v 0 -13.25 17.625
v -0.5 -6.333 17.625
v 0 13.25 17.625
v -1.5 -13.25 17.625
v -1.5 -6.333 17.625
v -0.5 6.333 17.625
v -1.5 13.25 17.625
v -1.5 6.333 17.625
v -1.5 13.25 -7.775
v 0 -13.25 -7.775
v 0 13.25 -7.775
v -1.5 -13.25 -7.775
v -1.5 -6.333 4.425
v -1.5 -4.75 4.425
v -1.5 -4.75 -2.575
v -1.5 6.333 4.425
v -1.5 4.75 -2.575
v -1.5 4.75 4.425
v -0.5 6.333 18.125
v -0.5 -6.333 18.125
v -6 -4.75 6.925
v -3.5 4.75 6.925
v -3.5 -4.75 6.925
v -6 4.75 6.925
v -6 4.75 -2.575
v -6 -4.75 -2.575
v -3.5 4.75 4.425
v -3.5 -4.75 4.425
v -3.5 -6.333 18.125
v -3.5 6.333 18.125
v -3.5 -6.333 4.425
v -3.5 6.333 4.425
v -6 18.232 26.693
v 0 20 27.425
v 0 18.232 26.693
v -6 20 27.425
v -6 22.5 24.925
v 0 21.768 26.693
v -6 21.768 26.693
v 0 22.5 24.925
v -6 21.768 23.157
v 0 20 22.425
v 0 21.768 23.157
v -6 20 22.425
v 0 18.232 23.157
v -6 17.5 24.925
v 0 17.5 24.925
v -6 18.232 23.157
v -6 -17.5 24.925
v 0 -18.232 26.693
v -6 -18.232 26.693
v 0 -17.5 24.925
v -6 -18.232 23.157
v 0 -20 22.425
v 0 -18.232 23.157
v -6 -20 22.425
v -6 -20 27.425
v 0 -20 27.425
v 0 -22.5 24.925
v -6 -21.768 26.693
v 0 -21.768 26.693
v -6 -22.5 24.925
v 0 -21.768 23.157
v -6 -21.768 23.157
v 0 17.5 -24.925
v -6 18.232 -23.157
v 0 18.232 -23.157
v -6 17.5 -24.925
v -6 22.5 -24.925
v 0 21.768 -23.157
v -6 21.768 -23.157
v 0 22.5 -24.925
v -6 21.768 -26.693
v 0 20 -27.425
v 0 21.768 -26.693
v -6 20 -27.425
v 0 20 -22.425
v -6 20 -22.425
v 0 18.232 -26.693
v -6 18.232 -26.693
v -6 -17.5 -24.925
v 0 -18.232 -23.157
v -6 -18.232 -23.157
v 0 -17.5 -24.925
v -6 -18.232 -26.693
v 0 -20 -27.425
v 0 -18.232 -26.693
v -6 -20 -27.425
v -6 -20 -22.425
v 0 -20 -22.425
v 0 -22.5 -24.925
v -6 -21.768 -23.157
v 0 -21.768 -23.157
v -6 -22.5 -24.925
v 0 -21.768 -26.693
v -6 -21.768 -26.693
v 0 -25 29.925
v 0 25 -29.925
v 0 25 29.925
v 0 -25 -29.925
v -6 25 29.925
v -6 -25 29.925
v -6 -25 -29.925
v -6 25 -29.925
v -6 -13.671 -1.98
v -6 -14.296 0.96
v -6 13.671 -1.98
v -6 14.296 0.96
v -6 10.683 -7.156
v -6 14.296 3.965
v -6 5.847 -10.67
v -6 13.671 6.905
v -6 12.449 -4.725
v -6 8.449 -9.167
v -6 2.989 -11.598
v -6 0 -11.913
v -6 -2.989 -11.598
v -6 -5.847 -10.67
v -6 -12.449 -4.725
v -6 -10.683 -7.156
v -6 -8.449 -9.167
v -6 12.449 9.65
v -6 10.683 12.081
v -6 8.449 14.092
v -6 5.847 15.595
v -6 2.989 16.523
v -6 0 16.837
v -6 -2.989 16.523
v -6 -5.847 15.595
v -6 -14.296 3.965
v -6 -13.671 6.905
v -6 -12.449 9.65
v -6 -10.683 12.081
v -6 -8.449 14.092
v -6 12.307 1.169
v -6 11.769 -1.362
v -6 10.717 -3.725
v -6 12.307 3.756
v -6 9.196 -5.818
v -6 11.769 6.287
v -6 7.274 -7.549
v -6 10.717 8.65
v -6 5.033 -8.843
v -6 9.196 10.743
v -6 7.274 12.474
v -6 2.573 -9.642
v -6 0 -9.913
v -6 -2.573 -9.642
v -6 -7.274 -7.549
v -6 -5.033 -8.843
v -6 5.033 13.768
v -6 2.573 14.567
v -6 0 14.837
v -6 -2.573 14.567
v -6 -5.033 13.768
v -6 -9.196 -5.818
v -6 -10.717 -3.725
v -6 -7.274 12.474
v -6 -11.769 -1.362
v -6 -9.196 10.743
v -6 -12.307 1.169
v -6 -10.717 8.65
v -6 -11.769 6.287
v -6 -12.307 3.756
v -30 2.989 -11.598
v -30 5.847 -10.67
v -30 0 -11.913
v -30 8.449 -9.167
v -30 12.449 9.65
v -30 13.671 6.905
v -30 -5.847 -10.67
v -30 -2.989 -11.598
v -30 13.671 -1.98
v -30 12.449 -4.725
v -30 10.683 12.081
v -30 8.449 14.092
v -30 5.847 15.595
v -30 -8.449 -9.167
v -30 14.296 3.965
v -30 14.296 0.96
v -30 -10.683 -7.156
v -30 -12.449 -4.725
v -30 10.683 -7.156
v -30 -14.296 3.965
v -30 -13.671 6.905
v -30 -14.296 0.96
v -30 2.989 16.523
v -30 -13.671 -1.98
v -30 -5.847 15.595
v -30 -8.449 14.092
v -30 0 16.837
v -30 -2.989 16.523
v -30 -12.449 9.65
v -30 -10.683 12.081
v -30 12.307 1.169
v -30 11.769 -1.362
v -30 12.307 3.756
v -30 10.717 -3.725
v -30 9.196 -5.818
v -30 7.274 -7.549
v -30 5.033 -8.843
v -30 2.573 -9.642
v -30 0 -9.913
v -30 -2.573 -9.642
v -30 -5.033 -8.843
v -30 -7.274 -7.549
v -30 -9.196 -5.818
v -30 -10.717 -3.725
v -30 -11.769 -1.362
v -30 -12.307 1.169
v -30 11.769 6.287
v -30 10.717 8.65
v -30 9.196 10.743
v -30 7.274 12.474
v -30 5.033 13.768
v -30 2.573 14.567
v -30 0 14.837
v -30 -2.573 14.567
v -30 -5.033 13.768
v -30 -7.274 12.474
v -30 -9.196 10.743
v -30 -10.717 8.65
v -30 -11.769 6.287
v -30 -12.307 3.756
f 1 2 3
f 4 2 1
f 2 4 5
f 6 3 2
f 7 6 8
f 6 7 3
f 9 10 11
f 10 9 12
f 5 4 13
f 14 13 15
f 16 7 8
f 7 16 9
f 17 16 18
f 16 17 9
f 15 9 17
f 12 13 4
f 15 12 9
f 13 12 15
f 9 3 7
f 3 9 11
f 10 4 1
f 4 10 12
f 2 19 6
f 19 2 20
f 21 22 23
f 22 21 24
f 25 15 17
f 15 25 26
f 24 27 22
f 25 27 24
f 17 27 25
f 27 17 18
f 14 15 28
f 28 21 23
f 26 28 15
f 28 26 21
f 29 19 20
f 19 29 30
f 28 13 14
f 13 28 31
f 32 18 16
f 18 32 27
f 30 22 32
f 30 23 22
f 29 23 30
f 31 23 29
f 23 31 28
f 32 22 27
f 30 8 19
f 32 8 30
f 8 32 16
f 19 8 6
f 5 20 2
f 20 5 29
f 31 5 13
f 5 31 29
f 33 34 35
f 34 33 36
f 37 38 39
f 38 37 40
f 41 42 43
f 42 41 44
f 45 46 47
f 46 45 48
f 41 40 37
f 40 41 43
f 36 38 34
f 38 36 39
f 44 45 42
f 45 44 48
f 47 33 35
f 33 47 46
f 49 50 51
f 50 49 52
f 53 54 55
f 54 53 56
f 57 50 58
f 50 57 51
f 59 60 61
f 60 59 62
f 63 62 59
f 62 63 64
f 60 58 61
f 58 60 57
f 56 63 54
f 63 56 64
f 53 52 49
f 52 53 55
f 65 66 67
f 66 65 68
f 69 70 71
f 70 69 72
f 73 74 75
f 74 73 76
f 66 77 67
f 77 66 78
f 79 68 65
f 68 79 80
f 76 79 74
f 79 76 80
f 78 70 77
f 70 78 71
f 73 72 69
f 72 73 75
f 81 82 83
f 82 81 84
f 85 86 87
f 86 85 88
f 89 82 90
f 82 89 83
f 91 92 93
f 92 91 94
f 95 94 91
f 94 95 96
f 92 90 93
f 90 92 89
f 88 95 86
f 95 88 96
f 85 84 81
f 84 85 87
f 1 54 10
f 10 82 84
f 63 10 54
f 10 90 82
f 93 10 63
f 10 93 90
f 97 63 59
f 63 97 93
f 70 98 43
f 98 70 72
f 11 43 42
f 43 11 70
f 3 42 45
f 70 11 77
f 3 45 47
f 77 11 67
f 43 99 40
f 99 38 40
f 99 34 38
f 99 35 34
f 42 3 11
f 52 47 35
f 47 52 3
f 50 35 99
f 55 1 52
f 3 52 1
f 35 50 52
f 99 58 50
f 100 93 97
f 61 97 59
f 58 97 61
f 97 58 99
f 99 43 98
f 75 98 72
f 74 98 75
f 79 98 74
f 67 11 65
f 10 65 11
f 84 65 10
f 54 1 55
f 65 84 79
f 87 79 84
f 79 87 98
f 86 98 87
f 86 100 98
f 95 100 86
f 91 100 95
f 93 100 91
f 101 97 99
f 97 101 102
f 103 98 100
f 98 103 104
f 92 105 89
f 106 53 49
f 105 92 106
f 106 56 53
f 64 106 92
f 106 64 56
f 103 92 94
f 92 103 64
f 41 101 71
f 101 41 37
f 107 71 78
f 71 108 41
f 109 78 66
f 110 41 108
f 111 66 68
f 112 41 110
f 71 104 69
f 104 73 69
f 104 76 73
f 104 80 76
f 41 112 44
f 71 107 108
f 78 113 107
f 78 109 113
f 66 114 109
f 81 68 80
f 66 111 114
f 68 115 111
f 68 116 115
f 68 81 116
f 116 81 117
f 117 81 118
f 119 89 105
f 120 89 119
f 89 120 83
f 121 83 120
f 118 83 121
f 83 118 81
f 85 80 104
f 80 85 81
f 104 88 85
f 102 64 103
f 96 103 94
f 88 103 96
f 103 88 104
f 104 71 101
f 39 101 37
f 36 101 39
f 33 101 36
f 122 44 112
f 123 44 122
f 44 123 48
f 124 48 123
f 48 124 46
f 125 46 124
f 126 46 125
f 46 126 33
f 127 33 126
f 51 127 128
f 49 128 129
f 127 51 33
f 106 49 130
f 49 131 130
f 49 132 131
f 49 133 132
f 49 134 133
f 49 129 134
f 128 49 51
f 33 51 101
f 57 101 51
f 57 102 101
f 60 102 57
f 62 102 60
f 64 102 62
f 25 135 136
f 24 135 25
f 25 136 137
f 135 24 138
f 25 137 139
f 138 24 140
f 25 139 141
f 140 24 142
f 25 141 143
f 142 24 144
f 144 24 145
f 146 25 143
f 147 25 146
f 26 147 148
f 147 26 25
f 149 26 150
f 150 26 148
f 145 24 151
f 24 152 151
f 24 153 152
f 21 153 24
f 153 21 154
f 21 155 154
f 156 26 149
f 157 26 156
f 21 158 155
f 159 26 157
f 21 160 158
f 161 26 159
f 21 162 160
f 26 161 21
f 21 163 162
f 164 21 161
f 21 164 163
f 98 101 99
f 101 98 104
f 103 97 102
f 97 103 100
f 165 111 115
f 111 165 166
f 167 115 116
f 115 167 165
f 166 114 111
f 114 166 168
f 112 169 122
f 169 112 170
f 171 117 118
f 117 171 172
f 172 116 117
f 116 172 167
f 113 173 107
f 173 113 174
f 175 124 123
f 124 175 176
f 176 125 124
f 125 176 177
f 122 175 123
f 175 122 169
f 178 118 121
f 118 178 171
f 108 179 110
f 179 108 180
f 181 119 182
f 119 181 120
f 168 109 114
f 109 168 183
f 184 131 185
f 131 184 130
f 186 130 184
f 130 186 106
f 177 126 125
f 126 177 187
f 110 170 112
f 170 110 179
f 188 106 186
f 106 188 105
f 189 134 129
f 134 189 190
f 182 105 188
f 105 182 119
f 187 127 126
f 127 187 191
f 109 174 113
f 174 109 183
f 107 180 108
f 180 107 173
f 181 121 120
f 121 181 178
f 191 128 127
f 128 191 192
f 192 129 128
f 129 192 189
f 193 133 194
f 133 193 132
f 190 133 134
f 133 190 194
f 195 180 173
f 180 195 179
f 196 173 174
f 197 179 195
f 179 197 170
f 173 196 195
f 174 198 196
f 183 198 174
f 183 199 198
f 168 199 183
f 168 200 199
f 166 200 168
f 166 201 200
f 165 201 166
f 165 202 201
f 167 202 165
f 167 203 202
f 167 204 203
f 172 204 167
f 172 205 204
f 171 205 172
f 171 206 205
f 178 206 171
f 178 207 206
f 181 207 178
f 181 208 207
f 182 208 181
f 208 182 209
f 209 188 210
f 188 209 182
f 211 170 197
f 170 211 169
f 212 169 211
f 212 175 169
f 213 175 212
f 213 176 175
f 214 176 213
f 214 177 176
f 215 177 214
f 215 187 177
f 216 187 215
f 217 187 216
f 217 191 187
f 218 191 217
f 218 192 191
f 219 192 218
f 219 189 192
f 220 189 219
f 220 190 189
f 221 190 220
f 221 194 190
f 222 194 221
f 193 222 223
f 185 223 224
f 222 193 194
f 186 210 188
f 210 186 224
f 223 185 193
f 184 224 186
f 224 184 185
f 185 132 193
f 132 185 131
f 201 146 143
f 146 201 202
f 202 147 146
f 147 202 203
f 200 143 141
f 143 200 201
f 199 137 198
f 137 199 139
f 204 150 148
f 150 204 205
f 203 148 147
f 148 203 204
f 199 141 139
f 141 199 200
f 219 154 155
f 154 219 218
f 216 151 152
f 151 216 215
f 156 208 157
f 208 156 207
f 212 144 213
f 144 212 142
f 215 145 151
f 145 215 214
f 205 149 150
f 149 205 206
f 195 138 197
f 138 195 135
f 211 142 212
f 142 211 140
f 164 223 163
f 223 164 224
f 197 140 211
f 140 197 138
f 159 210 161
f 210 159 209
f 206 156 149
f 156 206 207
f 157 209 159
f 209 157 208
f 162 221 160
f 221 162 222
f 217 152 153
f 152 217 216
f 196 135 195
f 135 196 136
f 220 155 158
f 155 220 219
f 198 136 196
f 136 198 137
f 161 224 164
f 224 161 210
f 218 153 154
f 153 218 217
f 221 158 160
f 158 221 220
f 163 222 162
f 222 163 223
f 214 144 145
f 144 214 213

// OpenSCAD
// file: ../cameramount/PiCameraMount.scad
/*
 * openSCAD for a simple mount for the Raspberry PI Camera Module
 *
 * This file is not for standalone use - it's included in to another
 * openSCAN file for including in to another model.
 *
 * Copyright 2015 Peter T Mount
 * 
 * Licensed under the Apache License, Version 2.0 (the "License");
 * you may not use this file except in compliance with the License.
 * You may obtain a copy of the License at
 * 
 * http://www.apache.org/licenses/LICENSE-2.0
 * 
 * Unless required by applicable law or agreed to in writing, software
 * distributed under the License is distributed on an "AS IS" BASIS,
 * WITHOUT WARRANTIES OR CONDITIONS OF ANY KIND, either express or implied.
 * See the License for the specific language governing permissions and
 * limitations under the License.
 *
 */

/*
 * Measured dimensions of a PI Camera Module.
 *
 * These are based on actual measurements and those manually measured by Gert van Loo
 * and published on Scribd:
 *
 *		http://www.scribd.com/doc/142718448/Raspberry-Pi-Camera-Mechanical-Data
 *
 * Width & Depth are the exterior dimensions, width being the edge with the ribbon.
 *
 * We add 1.5 to these to give some room and account for the printer as it seems
 * to give a better fit.
 *
 * y offset is the height from the bottom of the center of the camera lens.
 *
 * ribbon width is just that, if required
 */
piCameraWidth=25 +1.5;
piCameraDepth=23.9 +1.5;
piCameraRibbonWidth=16.2 +0.5;
piCameraLensSize=8 +1.5;
piCameraYOffset=5.1+(piCameraLensSize/2);

/*
 * Module to render a PI camera mount.
 *
 * To use translate it into the required position so that the camera lens
 * is at the origin & pointing along the x axis.
 *
 * Then call piCameraMount(radius,mode)
 *
 * Where:
 *		width	the width of the component
 *		mode	The mode of the render
 *
 * The width must be >30mm as it's used to include the mounting hardware.
 * However you can enlarge it.
 *
 * The mode defines how it's rendered:
 *		0	Render the front panel
 *		1	Render the back panel
 *		2	Render a plain panel with just the mounting holes
 *    3	As 1 but cable exit on back is internal rather than at the bottom of the plate
 */

module piCamera(width,mode) {
	assign(
		tubeRadius=width/2,
		piCameraLensHalf=piCameraLensSize/2,
		piCameraWHalf=piCameraWidth/2,
		piCameraDHalf=piCameraDepth/2,
		offset=piCameraYOffset
	) {
		translate([0,0,piCameraYOffset/2]) union() {
			// Front panel
			difference() {
				if(mode==1 || mode==3)
					translate([6,-tubeRadius,-tubeRadius-offset]) cube([6,width,width+offset]);
				else
					translate([0,-tubeRadius,-tubeRadius-offset]) cube([6,width,width+offset]);

//				translate([4,-tubeRadius-1,-tubeRadius-offset-1]) cube([2,width+2,width+offset+2]);

				if(mode!=2) {
					// Holder for the pi camera module
					translate([4.5,-piCameraWHalf,-piCameraDHalf])
						cube([2.2,piCameraWidth,piCameraDepth]);

					// Holder for components on rear of module
					translate([6,1-piCameraWHalf,1-piCameraDHalf])
						cube([3,piCameraWidth-2,piCameraDepth-2]);
					translate([6,-piCameraWHalf,-piCameraDHalf])
						cube([3,piCameraWidth,9.5]);

					// Hole for the camera lens
					translate([-0.5,-piCameraLensHalf,2-piCameraLensSize])
						cube([6,piCameraLensSize,piCameraLensSize]);

					// Indent for ribbon holder on front of the module
					translate([2.5,-piCameraLensSize*2/3,-0.5])
						cube([3,piCameraLensSize*4/3,piCameraDHalf+1]);
		
					// Space for ribbon cable
					if(mode==1)
						translate([ 5, -piCameraRibbonWidth/2,-tubeRadius-1-offset])
							cube([3,piCameraRibbonWidth,tubeRadius+1+offset]);
					else if(mode==3) {
						translate([ 5, -piCameraRibbonWidth/2,14-tubeRadius-1-offset])
							cube([4,piCameraRibbonWidth,15]);
						translate([ 5, -piCameraRibbonWidth/2,14-tubeRadius-1-offset])
							cube([10,piCameraRibbonWidth,5]);
					}
				}

				// M4 mounting holes
				piCameraHoles(width,15);
			}
		}

	}
}

module piCameraHoles(width,h) {
	assign(tubeRadius=width/2) {
		for(h=[0:3])
			translate([-1,
				(h%2) ? (-tubeRadius+5) : (tubeRadius-5),
				(floor(h/2)) ? (-tubeRadius+5-piCameraYOffset) : (tubeRadius-5)
			])
			rotate([0,90,0])
			cylinder(h=15,r=2.5);
	}
}
// file: ../Common.scad
/*
 * openSCAD Common features
 *
 * This file is not for standalone use - it's included in to another
 * openSCAN file for including in to another model.
 *
 * Copyright 2015 Peter T Mount
 * 
 * Licensed under the Apache License, Version 2.0 (the "License");
 * you may not use this file except in compliance with the License.
 * You may obtain a copy of the License at
 * 
 * http://www.apache.org/licenses/LICENSE-2.0
 * 
 * Unless required by applicable law or agreed to in writing, software
 * distributed under the License is distributed on an "AS IS" BASIS,
 * WITHOUT WARRANTIES OR CONDITIONS OF ANY KIND, either express or implied.
 * See the License for the specific language governing permissions and
 * limitations under the License.
 *
 */

/*
 * Bolt sizes - these are for the holes hence +0.25mm, measurements in radius
 */
M4=2.25;
M5=2.75;
M6=3.25;
// file: eyepiece.scad
/*
 * openSCAD for an adapter for attaching the Raspberry PI Camera Module 
 * to a telescope.
 *
 * This model comes in two parts, the eyepiece mount which attaches directly
 * to the telescope (no eyepiece required) and the back plate.
 *
 * However it's intended that the backplate be incorporated into another model
 * so that the PI itself is mounted with the camera.
 *
 * Copyright 2015 Peter T Mount
 * 
 * Licensed under the Apache License, Version 2.0 (the "License");
 * you may not use this file except in compliance with the License.
 * You may obtain a copy of the License at
 * 
 * http://www.apache.org/licenses/LICENSE-2.0
 * 
 * Unless required by applicable law or agreed to in writing, software
 * distributed under the License is distributed on an "AS IS" BASIS,
 * WITHOUT WARRANTIES OR CONDITIONS OF ANY KIND, either express or implied.
 * See the License for the specific language governing permissions and
 * limitations under the License.
 *
 */

include <../Common.scad>
include <../cameramount/PiCameraMount.scad>

module eyepiece(diam,mode) {
	// eyediam is the eyepiece diameter, adjusting for extruder diameter
	assign(
		eyediam=(diam*25.4)-3
	) {
		assign(
			eyerad=eyediam/2,
			eyewidth=max(50,eyediam+10)
		) {
			if(mode==0 || mode==2) translate([-6,0,0]) eyepieceFront(eyewidth,eyerad);
			if(mode==1 || mode==2) translate([-6,0,0]) eyepieceBack(eyewidth);
			if(mode==3) {
			  	translate([6,0,0]) rotate([0,0,180]) eyepieceFront(eyewidth,eyerad);
				translate([-6,-eyewidth*3/2,0]) eyepieceBack(eyewidth);
			}
		}
	}
}

module eyepieceFront(eyewidth,eyerad) {
	union() {
		piCamera(eyewidth,0);
		translate([-24,0,piCameraYOffset/4]) rotate([0,90,0]) difference() {
			cylinder( h=24,r=eyerad);
			translate([0,0,-2]) cylinder( h=27,r=eyerad-2);
		}
	}
}

module eyepieceBack(eyewidth) {
	piCamera(eyewidth,3);
}
// main file
/*
 * openSCAD for an adapter for attaching the Raspberry PI Camera Module 
 * to a telescope.
 *
 * This model comes in two parts, the eyepiece mount which attaches directly
 * to the telescope (no eyepiece required) and the back plate.
 *
 * However it's intended that the backplate be incorporated into another model
 * so that the PI itself is mounted with the camera.
 *
 * Copyright 2015 Peter T Mount
 * 
 * Licensed under the Apache License, Version 2.0 (the "License");
 * you may not use this file except in compliance with the License.
 * You may obtain a copy of the License at
 * 
 * http://www.apache.org/licenses/LICENSE-2.0
 * 
 * Unless required by applicable law or agreed to in writing, software
 * distributed under the License is distributed on an "AS IS" BASIS,
 * WITHOUT WARRANTIES OR CONDITIONS OF ANY KIND, either express or implied.
 * See the License for the specific language governing permissions and
 * limitations under the License.
 *
 */

include <eyepiece.scad>

eyepiece(1.25,0);
